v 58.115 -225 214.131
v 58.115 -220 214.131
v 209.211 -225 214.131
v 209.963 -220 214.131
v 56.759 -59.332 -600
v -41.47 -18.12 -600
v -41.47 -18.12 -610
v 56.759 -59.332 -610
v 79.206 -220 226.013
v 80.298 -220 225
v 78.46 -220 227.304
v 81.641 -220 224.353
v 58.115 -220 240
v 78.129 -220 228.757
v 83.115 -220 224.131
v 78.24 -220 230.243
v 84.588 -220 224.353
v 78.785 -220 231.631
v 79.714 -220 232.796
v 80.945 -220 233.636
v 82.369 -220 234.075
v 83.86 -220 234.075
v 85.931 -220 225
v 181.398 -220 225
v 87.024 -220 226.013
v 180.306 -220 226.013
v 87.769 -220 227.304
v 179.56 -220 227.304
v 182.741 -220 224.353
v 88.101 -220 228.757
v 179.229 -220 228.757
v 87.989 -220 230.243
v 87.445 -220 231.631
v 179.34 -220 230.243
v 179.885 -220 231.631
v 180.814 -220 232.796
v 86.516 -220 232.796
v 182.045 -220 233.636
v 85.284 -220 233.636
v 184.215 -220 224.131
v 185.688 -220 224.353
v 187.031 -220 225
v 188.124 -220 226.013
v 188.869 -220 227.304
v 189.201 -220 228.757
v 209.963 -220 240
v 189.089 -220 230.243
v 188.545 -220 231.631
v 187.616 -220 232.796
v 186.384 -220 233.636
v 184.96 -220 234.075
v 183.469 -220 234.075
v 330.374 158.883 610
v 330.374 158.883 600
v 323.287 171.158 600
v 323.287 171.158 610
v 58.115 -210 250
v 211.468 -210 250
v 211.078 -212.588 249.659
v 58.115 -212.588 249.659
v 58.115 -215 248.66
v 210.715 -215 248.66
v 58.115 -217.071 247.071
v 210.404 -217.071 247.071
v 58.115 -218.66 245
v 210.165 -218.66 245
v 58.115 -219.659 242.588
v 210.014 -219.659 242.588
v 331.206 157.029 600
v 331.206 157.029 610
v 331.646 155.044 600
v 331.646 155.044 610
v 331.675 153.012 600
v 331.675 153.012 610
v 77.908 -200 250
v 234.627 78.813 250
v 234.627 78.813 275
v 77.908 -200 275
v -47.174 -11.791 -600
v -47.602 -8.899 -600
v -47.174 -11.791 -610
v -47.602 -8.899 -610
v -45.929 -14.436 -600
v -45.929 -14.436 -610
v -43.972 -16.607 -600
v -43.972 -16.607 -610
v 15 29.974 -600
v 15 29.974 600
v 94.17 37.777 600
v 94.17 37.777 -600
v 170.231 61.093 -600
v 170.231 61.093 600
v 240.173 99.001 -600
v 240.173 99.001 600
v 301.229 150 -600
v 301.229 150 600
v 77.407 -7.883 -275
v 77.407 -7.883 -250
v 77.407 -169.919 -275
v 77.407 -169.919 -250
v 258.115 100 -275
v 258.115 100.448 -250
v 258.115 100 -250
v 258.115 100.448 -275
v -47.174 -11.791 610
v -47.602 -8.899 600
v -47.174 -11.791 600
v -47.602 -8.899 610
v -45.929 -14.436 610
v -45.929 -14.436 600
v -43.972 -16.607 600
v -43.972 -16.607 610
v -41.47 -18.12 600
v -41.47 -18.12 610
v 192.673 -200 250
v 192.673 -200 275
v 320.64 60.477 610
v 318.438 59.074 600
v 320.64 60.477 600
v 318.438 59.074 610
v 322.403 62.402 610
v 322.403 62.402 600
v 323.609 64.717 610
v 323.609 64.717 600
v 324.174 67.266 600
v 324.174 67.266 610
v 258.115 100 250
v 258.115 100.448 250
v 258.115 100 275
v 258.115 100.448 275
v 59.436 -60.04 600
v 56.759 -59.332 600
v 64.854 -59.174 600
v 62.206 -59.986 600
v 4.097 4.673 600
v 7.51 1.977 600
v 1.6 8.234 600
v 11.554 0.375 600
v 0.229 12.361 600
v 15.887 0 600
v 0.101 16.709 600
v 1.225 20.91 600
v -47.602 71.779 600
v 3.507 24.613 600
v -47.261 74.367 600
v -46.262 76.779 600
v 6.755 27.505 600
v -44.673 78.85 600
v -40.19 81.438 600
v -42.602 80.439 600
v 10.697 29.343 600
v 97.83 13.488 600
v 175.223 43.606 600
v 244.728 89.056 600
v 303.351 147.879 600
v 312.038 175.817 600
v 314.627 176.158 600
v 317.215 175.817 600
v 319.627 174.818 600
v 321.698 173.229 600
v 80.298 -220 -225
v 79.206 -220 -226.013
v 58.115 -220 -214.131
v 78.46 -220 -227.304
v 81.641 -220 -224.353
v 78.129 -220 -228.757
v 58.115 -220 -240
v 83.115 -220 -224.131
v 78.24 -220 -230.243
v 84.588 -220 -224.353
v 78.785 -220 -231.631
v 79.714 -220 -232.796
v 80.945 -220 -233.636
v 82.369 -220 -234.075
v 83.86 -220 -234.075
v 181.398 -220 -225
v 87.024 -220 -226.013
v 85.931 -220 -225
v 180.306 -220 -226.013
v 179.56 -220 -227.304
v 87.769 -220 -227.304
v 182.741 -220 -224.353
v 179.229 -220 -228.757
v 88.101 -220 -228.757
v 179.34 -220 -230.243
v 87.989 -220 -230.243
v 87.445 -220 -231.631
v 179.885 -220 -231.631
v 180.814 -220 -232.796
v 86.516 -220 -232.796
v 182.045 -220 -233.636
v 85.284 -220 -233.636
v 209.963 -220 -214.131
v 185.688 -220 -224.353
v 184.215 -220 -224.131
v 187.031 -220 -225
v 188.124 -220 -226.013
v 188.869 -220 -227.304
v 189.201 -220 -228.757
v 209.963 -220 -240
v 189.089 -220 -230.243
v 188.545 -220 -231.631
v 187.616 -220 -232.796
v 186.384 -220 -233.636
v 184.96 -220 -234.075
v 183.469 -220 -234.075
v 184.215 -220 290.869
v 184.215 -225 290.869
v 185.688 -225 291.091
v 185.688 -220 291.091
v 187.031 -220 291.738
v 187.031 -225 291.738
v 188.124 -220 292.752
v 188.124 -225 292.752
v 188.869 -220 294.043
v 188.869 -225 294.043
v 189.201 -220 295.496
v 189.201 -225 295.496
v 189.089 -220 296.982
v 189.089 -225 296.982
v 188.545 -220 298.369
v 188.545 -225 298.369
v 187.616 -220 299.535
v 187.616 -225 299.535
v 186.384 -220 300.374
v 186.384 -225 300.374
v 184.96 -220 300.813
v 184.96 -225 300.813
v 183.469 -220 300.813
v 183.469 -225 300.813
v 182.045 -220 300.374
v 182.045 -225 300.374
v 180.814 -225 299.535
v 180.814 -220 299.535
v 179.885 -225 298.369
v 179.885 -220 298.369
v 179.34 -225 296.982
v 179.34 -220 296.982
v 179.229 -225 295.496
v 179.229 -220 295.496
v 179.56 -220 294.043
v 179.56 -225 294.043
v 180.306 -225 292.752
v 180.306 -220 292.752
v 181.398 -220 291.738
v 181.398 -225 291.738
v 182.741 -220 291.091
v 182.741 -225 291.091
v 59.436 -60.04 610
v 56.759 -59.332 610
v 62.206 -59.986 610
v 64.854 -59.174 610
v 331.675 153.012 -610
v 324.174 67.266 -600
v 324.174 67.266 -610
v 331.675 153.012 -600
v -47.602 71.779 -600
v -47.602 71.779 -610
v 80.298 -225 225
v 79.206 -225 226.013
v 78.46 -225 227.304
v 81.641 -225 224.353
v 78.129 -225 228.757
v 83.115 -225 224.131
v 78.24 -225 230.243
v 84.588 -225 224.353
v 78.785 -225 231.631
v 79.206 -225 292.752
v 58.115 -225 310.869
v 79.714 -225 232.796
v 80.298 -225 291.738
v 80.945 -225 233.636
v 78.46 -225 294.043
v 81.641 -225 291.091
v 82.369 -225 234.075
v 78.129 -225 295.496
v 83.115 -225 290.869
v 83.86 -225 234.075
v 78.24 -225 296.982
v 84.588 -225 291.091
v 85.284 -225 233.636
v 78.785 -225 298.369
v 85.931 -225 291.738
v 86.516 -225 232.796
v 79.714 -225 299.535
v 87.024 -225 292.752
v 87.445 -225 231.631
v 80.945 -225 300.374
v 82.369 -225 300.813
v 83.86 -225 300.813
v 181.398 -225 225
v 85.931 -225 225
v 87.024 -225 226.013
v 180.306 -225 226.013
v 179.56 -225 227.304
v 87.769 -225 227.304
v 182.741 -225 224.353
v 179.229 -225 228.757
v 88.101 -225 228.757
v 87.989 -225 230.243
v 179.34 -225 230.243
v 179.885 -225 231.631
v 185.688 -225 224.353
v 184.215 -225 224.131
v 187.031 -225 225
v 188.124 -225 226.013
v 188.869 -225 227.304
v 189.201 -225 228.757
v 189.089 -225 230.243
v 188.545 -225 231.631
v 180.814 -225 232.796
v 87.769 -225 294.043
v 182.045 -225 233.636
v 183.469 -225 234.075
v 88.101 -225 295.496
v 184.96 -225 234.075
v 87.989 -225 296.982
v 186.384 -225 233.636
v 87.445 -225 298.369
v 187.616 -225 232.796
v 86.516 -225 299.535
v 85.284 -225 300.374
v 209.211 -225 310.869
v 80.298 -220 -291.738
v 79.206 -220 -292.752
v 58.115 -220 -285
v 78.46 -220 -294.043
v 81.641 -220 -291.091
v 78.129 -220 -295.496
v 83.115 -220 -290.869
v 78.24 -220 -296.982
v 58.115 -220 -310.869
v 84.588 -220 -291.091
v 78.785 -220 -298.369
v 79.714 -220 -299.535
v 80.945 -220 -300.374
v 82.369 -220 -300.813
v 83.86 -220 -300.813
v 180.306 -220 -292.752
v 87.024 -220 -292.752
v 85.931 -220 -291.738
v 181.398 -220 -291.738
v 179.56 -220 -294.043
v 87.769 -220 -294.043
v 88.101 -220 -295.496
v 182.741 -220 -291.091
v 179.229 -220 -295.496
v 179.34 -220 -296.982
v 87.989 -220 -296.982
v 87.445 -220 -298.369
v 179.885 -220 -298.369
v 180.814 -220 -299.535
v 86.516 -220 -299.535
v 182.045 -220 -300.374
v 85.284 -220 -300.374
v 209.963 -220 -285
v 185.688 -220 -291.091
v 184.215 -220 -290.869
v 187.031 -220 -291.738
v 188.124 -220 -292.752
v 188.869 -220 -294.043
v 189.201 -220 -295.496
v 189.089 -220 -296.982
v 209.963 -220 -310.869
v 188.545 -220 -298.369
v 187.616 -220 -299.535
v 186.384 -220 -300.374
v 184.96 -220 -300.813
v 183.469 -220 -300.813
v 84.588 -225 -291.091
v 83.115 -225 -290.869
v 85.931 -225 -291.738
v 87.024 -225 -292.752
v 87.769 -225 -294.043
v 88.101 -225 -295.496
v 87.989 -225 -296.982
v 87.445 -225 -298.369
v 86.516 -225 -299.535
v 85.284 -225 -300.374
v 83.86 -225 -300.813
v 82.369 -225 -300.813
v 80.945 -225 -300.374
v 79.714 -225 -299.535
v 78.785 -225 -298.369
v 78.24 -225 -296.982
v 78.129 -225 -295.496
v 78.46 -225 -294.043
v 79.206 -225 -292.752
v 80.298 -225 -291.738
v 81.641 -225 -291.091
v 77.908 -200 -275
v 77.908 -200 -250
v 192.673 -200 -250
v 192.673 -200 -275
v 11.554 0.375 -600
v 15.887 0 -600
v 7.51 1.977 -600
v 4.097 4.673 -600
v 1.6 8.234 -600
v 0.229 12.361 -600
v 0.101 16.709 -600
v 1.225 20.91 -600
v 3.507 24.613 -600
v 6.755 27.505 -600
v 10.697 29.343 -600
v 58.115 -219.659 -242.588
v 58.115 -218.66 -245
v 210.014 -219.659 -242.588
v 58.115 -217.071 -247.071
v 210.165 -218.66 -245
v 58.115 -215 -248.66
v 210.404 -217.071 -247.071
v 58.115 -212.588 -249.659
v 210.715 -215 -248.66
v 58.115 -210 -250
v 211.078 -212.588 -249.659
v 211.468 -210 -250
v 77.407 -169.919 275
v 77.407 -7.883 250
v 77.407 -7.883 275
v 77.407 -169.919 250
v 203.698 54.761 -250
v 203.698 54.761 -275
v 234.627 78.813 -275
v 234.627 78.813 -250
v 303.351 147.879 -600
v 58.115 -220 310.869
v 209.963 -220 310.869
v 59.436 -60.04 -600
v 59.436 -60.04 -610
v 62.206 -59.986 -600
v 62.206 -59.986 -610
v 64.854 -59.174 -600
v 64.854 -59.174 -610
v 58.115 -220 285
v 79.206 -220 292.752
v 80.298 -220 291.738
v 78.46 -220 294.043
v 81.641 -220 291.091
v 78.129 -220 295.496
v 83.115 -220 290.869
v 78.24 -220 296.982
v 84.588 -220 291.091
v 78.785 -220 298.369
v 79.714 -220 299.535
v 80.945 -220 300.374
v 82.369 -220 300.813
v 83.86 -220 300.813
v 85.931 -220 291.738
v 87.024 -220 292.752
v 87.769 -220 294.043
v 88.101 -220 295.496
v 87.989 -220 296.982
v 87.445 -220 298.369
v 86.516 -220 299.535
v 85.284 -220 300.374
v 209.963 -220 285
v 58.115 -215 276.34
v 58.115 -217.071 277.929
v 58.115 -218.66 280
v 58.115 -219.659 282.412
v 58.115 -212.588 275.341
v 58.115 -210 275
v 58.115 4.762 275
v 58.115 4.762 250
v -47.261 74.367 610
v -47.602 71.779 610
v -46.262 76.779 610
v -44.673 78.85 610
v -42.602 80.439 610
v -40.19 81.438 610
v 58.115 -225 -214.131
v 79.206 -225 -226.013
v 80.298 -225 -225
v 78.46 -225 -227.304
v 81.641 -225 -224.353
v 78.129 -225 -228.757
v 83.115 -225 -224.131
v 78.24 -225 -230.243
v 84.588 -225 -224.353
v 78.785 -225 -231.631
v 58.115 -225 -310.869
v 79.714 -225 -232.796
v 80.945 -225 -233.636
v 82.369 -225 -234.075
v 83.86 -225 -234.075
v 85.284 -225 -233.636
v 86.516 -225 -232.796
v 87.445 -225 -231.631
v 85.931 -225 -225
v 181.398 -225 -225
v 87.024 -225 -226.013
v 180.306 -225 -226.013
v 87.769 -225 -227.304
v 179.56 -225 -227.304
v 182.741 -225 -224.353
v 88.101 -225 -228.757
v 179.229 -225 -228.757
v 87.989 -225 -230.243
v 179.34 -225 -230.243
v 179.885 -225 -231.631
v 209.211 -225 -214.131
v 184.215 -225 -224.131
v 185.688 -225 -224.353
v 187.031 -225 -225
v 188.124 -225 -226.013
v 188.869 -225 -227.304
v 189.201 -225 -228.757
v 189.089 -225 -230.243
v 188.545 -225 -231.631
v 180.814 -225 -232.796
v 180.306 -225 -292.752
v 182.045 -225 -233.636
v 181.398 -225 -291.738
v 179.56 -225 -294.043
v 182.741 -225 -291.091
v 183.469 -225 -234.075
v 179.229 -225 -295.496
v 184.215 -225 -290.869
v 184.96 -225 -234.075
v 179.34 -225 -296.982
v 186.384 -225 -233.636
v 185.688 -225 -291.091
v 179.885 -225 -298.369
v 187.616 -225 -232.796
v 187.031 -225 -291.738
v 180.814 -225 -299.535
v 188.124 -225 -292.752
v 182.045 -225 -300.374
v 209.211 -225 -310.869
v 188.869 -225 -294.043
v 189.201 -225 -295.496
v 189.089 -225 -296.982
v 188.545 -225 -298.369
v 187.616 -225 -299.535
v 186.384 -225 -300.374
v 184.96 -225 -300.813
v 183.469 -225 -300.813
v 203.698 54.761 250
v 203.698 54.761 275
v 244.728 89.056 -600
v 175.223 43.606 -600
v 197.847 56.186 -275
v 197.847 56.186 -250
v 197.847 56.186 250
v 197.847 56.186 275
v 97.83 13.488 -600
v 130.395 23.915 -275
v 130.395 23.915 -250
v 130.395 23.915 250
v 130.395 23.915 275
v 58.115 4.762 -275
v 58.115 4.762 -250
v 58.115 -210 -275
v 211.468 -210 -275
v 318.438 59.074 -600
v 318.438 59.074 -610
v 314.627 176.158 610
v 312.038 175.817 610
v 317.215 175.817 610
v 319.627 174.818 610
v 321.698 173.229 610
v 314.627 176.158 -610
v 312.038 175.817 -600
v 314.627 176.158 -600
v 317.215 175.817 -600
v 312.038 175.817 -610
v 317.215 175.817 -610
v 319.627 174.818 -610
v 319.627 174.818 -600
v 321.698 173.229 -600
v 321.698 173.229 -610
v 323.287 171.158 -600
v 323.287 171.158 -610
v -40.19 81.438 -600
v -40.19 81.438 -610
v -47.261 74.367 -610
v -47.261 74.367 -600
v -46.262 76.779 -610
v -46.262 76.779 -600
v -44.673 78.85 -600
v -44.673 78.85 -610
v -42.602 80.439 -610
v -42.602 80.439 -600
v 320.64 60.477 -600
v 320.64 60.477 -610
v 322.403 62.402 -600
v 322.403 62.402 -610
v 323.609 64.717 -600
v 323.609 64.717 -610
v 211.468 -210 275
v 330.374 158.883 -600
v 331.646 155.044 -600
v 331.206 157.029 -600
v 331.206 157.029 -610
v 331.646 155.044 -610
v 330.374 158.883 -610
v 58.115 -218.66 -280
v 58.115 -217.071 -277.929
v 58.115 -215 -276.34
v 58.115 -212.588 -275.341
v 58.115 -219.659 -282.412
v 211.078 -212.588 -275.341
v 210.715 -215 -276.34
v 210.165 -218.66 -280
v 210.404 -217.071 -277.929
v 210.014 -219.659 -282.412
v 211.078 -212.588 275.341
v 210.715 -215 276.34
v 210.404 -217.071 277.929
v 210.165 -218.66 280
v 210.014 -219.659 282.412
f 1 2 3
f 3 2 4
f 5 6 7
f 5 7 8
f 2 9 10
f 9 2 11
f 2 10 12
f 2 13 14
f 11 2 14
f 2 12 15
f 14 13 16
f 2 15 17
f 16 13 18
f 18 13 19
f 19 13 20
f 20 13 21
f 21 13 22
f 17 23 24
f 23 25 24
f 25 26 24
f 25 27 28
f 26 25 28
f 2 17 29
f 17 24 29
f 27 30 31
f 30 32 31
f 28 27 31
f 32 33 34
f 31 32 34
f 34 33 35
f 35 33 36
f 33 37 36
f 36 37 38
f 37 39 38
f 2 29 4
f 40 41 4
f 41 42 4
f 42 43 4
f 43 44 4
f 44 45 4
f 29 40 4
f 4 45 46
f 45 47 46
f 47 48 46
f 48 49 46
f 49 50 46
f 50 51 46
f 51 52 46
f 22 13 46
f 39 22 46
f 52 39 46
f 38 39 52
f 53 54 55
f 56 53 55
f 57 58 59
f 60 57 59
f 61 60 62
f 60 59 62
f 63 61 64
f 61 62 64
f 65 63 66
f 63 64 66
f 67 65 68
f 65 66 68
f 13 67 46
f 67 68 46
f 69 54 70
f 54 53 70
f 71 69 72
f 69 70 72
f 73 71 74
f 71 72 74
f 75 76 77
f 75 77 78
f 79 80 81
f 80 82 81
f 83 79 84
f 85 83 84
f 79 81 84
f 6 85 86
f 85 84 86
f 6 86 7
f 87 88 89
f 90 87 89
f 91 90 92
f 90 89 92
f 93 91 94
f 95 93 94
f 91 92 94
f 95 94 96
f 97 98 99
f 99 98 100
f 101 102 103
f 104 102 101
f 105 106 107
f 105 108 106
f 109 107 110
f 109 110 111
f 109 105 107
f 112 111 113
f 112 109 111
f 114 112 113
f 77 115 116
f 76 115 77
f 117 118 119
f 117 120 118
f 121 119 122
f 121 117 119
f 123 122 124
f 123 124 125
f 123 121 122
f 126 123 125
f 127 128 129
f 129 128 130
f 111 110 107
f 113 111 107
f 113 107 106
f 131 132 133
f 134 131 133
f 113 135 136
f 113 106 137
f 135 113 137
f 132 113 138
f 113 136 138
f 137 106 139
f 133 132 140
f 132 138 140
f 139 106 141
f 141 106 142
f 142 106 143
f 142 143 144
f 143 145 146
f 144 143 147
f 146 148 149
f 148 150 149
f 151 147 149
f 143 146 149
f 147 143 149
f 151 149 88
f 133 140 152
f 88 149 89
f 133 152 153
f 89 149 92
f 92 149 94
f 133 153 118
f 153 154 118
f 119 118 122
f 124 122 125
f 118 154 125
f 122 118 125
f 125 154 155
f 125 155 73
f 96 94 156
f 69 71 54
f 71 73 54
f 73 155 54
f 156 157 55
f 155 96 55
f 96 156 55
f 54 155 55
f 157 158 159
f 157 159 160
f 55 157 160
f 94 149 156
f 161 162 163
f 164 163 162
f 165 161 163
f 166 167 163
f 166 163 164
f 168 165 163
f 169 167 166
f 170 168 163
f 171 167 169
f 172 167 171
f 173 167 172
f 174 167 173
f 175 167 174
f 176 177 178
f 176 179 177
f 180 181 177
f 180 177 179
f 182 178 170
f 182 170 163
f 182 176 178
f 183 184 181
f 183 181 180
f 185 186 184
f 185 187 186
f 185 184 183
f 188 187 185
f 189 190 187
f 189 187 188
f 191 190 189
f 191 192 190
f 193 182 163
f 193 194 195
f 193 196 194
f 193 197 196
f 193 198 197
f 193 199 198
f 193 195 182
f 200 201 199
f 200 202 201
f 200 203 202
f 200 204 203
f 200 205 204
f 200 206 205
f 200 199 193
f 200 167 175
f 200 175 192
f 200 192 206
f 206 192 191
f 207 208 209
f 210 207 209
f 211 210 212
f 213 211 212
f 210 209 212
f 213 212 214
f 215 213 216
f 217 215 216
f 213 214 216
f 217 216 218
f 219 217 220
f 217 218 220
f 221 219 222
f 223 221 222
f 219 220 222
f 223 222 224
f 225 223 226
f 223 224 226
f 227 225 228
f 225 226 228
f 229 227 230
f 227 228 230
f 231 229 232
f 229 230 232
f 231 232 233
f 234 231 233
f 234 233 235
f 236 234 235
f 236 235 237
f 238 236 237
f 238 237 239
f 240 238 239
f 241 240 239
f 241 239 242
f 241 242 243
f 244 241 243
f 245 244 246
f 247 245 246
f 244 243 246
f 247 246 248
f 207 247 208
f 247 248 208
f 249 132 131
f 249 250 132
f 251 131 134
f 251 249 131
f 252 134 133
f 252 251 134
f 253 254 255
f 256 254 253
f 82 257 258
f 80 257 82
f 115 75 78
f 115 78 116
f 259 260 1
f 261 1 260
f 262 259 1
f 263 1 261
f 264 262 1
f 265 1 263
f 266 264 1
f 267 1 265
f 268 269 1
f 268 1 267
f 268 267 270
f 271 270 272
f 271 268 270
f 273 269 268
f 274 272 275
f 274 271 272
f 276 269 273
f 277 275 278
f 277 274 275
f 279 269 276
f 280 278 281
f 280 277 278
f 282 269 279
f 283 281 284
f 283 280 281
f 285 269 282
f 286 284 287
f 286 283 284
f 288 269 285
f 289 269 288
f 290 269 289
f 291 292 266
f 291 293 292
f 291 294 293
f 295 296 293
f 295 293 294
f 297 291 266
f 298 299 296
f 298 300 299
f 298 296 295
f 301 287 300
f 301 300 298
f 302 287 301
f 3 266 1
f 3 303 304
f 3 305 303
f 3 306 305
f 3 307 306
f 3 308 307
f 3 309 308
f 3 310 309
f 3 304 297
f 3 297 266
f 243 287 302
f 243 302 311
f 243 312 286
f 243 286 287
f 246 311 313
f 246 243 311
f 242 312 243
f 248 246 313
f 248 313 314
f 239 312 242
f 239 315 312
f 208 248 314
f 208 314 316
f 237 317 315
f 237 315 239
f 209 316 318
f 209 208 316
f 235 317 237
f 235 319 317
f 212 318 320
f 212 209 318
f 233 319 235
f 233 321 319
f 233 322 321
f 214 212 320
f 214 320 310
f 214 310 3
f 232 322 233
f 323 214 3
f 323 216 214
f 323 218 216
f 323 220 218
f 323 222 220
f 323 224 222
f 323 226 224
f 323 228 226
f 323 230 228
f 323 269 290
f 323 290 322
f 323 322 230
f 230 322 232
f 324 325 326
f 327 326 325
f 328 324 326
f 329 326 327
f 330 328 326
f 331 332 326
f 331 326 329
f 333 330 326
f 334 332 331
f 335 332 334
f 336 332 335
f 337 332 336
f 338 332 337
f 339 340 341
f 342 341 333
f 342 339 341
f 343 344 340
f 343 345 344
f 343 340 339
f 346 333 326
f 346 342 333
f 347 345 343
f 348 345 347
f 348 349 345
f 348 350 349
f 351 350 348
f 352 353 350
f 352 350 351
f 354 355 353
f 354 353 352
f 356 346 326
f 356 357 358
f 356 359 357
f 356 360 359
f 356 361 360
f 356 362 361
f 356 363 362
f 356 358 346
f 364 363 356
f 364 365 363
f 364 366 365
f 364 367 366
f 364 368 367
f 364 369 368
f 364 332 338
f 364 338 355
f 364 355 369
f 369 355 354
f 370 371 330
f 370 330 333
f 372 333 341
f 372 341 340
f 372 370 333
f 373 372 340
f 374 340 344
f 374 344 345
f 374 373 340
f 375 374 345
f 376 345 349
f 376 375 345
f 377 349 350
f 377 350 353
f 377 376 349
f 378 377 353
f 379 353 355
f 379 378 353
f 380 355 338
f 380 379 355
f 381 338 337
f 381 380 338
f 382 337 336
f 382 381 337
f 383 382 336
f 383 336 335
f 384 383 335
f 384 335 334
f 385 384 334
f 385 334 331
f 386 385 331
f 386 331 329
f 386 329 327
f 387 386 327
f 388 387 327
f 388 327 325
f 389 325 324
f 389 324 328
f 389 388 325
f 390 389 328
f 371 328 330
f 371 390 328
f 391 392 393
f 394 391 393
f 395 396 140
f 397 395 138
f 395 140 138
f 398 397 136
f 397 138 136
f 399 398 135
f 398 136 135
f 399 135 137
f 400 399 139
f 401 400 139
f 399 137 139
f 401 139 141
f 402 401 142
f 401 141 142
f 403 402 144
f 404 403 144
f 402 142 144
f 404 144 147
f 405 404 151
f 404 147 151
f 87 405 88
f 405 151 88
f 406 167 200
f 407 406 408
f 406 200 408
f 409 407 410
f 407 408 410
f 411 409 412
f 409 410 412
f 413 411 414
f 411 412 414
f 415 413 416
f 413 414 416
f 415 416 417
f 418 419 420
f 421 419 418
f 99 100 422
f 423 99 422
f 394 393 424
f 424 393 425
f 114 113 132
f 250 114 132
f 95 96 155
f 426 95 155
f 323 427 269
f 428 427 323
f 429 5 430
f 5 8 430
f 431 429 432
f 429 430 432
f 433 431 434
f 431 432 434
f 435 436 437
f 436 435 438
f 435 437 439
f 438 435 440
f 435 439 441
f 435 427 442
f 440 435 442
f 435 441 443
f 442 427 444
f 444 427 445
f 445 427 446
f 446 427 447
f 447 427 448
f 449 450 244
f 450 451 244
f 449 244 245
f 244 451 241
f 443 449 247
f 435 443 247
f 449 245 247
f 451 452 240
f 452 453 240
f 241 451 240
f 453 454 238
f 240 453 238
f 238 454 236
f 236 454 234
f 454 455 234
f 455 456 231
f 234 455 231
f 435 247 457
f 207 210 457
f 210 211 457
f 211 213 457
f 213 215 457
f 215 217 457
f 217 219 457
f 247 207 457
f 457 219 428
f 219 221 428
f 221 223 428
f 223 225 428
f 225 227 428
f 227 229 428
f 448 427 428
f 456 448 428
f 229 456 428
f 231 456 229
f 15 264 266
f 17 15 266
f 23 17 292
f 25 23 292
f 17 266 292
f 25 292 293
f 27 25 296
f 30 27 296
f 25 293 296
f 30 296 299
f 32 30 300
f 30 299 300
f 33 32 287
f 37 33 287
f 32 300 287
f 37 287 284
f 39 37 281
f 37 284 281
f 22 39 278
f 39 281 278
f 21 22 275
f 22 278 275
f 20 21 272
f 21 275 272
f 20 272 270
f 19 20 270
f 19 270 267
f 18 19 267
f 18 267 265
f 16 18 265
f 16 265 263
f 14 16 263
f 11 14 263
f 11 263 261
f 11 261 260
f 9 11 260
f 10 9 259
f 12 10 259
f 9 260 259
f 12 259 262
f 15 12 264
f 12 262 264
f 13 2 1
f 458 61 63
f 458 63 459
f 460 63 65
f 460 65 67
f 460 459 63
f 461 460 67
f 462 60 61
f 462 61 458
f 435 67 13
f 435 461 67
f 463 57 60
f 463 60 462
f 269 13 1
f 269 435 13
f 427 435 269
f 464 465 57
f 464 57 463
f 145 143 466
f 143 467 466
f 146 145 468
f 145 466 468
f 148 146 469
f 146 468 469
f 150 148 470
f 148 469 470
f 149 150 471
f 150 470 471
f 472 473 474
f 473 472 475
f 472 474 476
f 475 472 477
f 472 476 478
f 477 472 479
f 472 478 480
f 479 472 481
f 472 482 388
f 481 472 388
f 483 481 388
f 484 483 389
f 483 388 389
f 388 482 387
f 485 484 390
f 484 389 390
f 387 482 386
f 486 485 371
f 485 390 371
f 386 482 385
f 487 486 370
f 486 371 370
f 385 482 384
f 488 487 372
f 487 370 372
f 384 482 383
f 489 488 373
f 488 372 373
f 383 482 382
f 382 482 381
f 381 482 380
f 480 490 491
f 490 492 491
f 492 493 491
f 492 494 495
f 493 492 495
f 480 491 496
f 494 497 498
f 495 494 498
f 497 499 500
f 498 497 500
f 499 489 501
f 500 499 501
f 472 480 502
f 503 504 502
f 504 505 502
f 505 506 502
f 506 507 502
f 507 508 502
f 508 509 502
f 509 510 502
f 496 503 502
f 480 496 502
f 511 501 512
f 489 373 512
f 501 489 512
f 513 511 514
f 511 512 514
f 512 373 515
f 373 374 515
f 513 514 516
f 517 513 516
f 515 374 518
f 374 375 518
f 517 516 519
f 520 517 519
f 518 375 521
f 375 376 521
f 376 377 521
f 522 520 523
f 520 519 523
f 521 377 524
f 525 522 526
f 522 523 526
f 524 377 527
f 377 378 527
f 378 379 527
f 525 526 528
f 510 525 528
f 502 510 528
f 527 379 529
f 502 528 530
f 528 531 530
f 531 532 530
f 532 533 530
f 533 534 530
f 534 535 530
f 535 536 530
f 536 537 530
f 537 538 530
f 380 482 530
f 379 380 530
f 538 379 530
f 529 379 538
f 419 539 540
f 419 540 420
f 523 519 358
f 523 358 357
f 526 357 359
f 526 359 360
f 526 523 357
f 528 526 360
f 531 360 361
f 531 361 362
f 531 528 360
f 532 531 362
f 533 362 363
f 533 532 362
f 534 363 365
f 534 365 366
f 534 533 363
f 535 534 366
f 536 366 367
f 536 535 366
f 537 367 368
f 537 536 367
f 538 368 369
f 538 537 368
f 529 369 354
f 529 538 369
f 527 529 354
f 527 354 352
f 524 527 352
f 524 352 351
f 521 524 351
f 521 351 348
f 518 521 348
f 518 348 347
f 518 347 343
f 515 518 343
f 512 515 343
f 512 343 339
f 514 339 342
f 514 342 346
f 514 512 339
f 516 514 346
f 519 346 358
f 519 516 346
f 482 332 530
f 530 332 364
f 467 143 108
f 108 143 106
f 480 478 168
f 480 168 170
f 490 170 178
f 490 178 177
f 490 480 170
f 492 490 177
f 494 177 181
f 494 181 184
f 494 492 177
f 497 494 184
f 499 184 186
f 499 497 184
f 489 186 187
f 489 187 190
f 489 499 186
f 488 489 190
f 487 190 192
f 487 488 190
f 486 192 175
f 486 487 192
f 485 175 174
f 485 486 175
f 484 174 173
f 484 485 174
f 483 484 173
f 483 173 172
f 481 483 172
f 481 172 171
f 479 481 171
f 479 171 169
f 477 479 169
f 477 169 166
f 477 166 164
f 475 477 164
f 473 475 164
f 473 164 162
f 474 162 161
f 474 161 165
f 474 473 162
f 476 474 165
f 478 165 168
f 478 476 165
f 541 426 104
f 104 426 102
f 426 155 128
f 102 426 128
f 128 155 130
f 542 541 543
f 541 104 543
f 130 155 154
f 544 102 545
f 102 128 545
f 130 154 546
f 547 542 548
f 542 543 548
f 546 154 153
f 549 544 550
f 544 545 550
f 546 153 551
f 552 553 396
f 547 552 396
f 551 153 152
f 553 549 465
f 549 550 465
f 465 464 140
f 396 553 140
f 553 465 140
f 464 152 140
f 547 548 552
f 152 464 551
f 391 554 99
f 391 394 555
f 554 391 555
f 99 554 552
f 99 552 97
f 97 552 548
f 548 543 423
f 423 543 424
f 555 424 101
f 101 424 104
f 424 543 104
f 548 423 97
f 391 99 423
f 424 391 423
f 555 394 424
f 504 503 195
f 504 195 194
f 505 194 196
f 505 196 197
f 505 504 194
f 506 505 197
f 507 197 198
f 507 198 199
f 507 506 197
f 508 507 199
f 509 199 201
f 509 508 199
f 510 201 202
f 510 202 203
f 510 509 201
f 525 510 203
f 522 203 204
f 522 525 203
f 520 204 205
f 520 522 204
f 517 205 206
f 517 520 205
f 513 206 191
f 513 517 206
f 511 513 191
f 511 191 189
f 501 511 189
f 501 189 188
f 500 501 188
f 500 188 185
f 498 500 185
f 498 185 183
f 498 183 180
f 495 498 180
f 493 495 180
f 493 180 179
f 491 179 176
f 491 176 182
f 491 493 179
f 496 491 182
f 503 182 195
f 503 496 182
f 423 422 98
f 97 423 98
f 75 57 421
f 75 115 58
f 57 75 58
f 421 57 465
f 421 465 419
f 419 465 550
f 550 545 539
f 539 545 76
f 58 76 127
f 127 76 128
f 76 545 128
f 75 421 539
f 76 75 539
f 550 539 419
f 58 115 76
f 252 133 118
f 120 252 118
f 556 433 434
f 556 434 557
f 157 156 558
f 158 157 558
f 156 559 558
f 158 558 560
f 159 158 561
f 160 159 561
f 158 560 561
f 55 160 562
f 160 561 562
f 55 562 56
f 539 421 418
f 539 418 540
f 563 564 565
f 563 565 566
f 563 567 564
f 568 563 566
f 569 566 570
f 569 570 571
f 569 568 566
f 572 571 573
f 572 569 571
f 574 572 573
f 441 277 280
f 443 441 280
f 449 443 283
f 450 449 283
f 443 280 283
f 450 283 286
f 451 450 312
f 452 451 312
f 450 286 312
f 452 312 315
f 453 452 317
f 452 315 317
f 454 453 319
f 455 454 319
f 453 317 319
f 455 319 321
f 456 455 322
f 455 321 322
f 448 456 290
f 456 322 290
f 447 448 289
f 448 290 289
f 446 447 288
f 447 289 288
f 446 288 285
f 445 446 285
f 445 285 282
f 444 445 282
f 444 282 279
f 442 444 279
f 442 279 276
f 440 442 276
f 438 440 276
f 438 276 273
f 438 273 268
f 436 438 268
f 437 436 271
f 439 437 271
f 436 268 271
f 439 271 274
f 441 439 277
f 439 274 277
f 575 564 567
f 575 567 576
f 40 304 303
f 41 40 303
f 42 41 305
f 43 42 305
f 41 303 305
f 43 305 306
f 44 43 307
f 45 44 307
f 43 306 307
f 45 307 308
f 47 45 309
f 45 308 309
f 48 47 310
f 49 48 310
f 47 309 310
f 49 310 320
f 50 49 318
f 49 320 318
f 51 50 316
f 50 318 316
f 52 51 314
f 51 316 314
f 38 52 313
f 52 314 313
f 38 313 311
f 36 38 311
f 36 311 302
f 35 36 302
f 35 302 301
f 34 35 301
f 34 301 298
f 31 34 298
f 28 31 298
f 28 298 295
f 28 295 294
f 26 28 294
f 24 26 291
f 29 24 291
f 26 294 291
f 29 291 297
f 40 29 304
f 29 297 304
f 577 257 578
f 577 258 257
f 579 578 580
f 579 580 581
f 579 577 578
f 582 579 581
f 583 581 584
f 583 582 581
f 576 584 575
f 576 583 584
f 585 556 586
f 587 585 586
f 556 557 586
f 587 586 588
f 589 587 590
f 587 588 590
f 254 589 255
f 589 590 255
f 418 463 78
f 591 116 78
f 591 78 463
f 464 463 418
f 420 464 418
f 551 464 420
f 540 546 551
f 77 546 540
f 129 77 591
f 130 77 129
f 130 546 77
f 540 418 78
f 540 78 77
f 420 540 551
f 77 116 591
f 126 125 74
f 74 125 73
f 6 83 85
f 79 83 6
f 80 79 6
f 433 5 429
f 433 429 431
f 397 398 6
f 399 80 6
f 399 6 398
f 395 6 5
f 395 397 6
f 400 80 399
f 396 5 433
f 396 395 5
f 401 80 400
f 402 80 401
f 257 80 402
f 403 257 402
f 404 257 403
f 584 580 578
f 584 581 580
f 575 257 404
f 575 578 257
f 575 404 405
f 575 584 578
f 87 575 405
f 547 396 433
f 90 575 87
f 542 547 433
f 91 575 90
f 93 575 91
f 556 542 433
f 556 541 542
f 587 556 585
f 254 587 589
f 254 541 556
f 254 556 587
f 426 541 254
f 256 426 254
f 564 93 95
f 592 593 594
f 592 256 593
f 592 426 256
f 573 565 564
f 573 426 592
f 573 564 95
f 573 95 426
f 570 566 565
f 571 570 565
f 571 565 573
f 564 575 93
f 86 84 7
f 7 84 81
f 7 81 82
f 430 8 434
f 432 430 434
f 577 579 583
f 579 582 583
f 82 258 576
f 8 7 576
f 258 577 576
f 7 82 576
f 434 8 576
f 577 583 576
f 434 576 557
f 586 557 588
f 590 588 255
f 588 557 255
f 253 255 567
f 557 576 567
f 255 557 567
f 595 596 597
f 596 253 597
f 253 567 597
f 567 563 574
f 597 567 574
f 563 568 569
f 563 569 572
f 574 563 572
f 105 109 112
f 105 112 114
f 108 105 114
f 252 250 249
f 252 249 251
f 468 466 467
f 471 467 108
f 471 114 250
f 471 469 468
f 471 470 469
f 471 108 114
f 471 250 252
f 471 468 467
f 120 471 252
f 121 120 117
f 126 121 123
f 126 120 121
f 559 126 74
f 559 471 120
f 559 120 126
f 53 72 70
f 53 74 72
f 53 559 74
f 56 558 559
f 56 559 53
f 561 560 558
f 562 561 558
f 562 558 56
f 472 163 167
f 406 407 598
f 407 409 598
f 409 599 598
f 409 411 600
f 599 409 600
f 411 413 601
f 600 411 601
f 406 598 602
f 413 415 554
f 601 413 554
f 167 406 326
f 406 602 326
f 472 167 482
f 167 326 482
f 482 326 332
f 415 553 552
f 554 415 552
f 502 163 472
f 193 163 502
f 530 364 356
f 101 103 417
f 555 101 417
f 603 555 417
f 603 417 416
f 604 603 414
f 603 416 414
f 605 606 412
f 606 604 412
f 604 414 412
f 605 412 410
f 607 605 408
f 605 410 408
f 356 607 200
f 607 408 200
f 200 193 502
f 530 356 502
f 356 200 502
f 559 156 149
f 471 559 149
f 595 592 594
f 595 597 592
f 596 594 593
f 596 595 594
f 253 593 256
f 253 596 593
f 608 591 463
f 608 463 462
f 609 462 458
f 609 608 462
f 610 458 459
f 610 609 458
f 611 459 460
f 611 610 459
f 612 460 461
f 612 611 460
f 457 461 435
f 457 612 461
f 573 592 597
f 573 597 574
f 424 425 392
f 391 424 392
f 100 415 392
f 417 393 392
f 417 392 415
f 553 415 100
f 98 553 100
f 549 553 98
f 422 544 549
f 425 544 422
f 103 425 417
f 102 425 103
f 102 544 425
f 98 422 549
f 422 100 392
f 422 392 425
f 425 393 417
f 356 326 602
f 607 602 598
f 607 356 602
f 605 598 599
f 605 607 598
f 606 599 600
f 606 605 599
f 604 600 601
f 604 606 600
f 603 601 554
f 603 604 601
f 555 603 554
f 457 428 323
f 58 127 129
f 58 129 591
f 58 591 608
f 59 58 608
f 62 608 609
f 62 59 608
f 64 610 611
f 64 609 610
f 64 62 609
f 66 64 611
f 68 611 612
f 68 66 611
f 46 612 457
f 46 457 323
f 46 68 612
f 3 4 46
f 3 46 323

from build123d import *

# Parameters (mm, degrees)
BOSS_EXTRUDE1_DEPTH             = 600
BOSS_EXTRUDE2_DEPTH             = 10
FILLET1_R                       = 10
FILLET1_OF_MIRROR2_R            = 10
BOSS_EXTRUDE3_REACH             = 718.356
SKETCH3_W                       = 200
SKETCH3_H                       = 25
BOSS_EXTRUDE3_DIRECTION_2_DEPTH = 220
SKETCH4_W                       = 200
SKETCH4_H                       = 96.738577366
BOSS_EXTRUDE4_DEPTH             = 5
FILLET3_R                       = 10
SKETCH5_R                       = 5
CUT_EXTRUDE1_DEPTH              = 5
CUT_EXTRUDE3_REACH              = 731.903
CUT_EXTRUDE3_DIRECTION_2_REACH  = 731.903


with BuildPart() as part:
    # Sketch1 → Boss-Extrude1 (new, symmetric)
    with BuildSketch(Plane.XY):
        with BuildLine():
            Line((301.229416671, 150), (303.350737014, 147.878679656))
            ThreePointArc((303.350737014, 147.878679656), (175.223022732, 43.605710521), (15.886569686, 0))
            ThreePointArc((15.886569686, 0), (0.006557212, 14.530298176), (15, 29.973776885))
            ThreePointArc((15, 29.973776885), (170.230890365, 61.093138188), (301.229416671, 150))
        make_face()
    extrude(amount=BOSS_EXTRUDE1_DEPTH, both=True)

    # Sketch2 → Boss-Extrude2 (add)
    with BuildSketch(Plane.XY.offset(600)):
        Polygon((-47.601621627, 79.452155227), (-47.601621627, -15.547844773), (60.841138561, -61.045034952), (323.670396802, 61.514260953), (331.950192363, 156.152757271), (319.450192363, 177.803392366), align=None)
    boss_extrude2 = extrude(amount=BOSS_EXTRUDE2_DEPTH)

    # Fillet1
    fillet1_edges = [part.edges().sort_by_distance(p)[0] for p in [
        (319.450192363, 177.803392366, 605),
        (-47.601621627, 79.452155227, 605),
        (-47.601621627, -15.547844773, 605),
        (60.841138561, -61.045034952, 605),
        (323.670396802, 61.514260953, 605),
        (331.950192363, 156.152757271, 605),
    ]]
    fillet(fillet1_edges, radius=FILLET1_R)

    # Mirror2: Boss-Extrude2 across plane
    add(boss_extrude2.mirror(Plane.XY))

    # Fillet1 of Mirror2
    fillet1_of_mirror2_edges = [part.edges().sort_by_distance(p)[0] for p in [
        (319.450192363, 177.803392366, -605),
        (-47.601621627, 79.452155227, -605),
        (-47.601621627, -15.547844773, -605),
        (60.841138561, -61.045034952, -605),
        (323.670396802, 61.514260953, -605),
        (331.950192363, 156.152757271, -605),
    ]]
    fillet(fillet1_of_mirror2_edges, radius=FILLET1_OF_MIRROR2_R)

    # Sketch3 → Boss-Extrude3 (add, up to next)
    with BuildSketch(Plane(origin=(0, 0, 0), x_dir=(1, 0, 0), z_dir=(0, 1, 0)), mode=Mode.PRIVATE) as boss_extrude3_sk1:
        with Locations((158.114708335, -262.5)):
            Rectangle(SKETCH3_W, SKETCH3_H)
    boss_extrude3_tool1 = extrude(boss_extrude3_sk1.sketch, amount=BOSS_EXTRUDE3_REACH, mode=Mode.PRIVATE) - part.part
    boss_extrude3 = boss_extrude3_tool1.solids().sort_by_distance((158.114708, 0, 262.5))[0]
    add(boss_extrude3)

    # Sketch3 → Boss-Extrude3 direction 2 (add)
    with BuildSketch(Plane(origin=(0, 0, 0), x_dir=(1, 0, 0), z_dir=(0, 1, 0))):
        with Locations((158.114708335, -262.5)):
            Rectangle(SKETCH3_W, SKETCH3_H)
    boss_extrude3_direction_2 = extrude(amount=-BOSS_EXTRUDE3_DIRECTION_2_DEPTH)

    # Mirror3: Boss-Extrude3, Boss-Extrude3 direction 2 across plane
    add(boss_extrude3.mirror(Plane.XY))
    add(boss_extrude3_direction_2.mirror(Plane.XY))

    # Sketch4 → Boss-Extrude4 (add)
    with BuildSketch(Plane.XZ.offset(220)):
        with Locations((158.114708335, 262.5)):
            Rectangle(SKETCH4_W, SKETCH4_H)
    boss_extrude4 = extrude(amount=BOSS_EXTRUDE4_DEPTH)

    # Mirror6: Boss-Extrude4 across plane
    add(boss_extrude4.mirror(Plane.XY))

    # Fillet3
    fillet3_edges = [part.edges().sort_by_distance(p)[0] for p in [
        (158.114708335, -220, 275),
        (158.114708335, -220, 250),
        (158.114708335, -220, -250),
        (158.114708335, -220, -275),
    ]]
    fillet(fillet3_edges, radius=FILLET3_R)

    # Sketch5 → Cut-Extrude1 (cut)
    with BuildSketch(Plane.XZ.offset(225)):
        with Locations(Location((83.114708335, 295.869288683, 0), (0, 0, 270))):
            Circle(SKETCH5_R)
        with Locations(Location((184.214708335, 295.869288683, 0), (0, 0, 270))):
            Circle(SKETCH5_R)
        with Locations(Location((184.214708335, 229.130711317, 0), (0, 0, 270))):
            Circle(SKETCH5_R)
        with Locations(Location((83.114708335, 229.130711317, 0), (0, 0, 270))):
            Circle(SKETCH5_R)
    cut_extrude1 = extrude(amount=-CUT_EXTRUDE1_DEPTH, mode=Mode.SUBTRACT)

    # Mirror7: Cut-Extrude1 across plane
    add(cut_extrude1.mirror(Plane.XY), mode=Mode.SUBTRACT)

    # Sketch8 → Cut-Extrude3 (cut, up to next)
    with BuildSketch(Plane.XY, mode=Mode.PRIVATE) as cut_extrude3_sk1:
        Polygon((258.114708335, 100), (209.210600029, -225), (258.114708335, -225), align=None)
    cut_extrude3_tool1 = extrude(cut_extrude3_sk1.sketch, amount=-CUT_EXTRUDE3_REACH, mode=Mode.PRIVATE) & part.part
    # Sketch8 → Cut-Extrude3 (cut, up to next)
    with BuildSketch(Plane.XY, mode=Mode.PRIVATE) as cut_extrude3_sk2:
        Polygon((192.672505063, -200), (234.626697196, 78.813230948), (77.908149081, -200), align=None)
    cut_extrude3_tool2 = extrude(cut_extrude3_sk2.sketch, amount=-CUT_EXTRUDE3_REACH, mode=Mode.PRIVATE) & part.part
    # Sketch8 → Cut-Extrude3 (cut, up to next)
    with BuildSketch(Plane.XY, mode=Mode.PRIVATE) as cut_extrude3_sk3:
        Polygon((77.406994689, -169.918867637), (203.697901707, 54.761466943), (77.406994689, -7.882832173), align=None)
    cut_extrude3_tool3 = extrude(cut_extrude3_sk3.sketch, amount=-CUT_EXTRUDE3_REACH, mode=Mode.PRIVATE) & part.part
    add(cut_extrude3_tool1.solids().sort_by_distance((241.813339, -116.666667, 0))[0], mode=Mode.SUBTRACT)
    add(cut_extrude3_tool2.solids().sort_by_distance((168.40245, -107.062256, 0))[0], mode=Mode.SUBTRACT)
    add(cut_extrude3_tool3.solids().sort_by_distance((119.503964, -41.013411, 0))[0], mode=Mode.SUBTRACT)

    # Sketch8 → Cut-Extrude3 direction 2 (cut, up to next)
    with BuildSketch(Plane.XY, mode=Mode.PRIVATE) as cut_extrude3_direction_2_sk1:
        Polygon((258.114708335, 100), (209.210600029, -225), (258.114708335, -225), align=None)
    cut_extrude3_direction_2_tool1 = extrude(cut_extrude3_direction_2_sk1.sketch, amount=CUT_EXTRUDE3_DIRECTION_2_REACH, mode=Mode.PRIVATE) & part.part
    # Sketch8 → Cut-Extrude3 direction 2 (cut, up to next)
    with BuildSketch(Plane.XY, mode=Mode.PRIVATE) as cut_extrude3_direction_2_sk2:
        Polygon((192.672505063, -200), (234.626697196, 78.813230948), (77.908149081, -200), align=None)
    cut_extrude3_direction_2_tool2 = extrude(cut_extrude3_direction_2_sk2.sketch, amount=CUT_EXTRUDE3_DIRECTION_2_REACH, mode=Mode.PRIVATE) & part.part
    # Sketch8 → Cut-Extrude3 direction 2 (cut, up to next)
    with BuildSketch(Plane.XY, mode=Mode.PRIVATE) as cut_extrude3_direction_2_sk3:
        Polygon((77.406994689, -169.918867637), (203.697901707, 54.761466943), (77.406994689, -7.882832173), align=None)
    cut_extrude3_direction_2_tool3 = extrude(cut_extrude3_direction_2_sk3.sketch, amount=CUT_EXTRUDE3_DIRECTION_2_REACH, mode=Mode.PRIVATE) & part.part
    add(cut_extrude3_direction_2_tool1.solids().sort_by_distance((241.813339, -116.666667, 0))[0], mode=Mode.SUBTRACT)
    add(cut_extrude3_direction_2_tool2.solids().sort_by_distance((168.40245, -107.062256, 0))[0], mode=Mode.SUBTRACT)
    add(cut_extrude3_direction_2_tool3.solids().sort_by_distance((119.503964, -41.013411, 0))[0], mode=Mode.SUBTRACT)


solid = part.part
